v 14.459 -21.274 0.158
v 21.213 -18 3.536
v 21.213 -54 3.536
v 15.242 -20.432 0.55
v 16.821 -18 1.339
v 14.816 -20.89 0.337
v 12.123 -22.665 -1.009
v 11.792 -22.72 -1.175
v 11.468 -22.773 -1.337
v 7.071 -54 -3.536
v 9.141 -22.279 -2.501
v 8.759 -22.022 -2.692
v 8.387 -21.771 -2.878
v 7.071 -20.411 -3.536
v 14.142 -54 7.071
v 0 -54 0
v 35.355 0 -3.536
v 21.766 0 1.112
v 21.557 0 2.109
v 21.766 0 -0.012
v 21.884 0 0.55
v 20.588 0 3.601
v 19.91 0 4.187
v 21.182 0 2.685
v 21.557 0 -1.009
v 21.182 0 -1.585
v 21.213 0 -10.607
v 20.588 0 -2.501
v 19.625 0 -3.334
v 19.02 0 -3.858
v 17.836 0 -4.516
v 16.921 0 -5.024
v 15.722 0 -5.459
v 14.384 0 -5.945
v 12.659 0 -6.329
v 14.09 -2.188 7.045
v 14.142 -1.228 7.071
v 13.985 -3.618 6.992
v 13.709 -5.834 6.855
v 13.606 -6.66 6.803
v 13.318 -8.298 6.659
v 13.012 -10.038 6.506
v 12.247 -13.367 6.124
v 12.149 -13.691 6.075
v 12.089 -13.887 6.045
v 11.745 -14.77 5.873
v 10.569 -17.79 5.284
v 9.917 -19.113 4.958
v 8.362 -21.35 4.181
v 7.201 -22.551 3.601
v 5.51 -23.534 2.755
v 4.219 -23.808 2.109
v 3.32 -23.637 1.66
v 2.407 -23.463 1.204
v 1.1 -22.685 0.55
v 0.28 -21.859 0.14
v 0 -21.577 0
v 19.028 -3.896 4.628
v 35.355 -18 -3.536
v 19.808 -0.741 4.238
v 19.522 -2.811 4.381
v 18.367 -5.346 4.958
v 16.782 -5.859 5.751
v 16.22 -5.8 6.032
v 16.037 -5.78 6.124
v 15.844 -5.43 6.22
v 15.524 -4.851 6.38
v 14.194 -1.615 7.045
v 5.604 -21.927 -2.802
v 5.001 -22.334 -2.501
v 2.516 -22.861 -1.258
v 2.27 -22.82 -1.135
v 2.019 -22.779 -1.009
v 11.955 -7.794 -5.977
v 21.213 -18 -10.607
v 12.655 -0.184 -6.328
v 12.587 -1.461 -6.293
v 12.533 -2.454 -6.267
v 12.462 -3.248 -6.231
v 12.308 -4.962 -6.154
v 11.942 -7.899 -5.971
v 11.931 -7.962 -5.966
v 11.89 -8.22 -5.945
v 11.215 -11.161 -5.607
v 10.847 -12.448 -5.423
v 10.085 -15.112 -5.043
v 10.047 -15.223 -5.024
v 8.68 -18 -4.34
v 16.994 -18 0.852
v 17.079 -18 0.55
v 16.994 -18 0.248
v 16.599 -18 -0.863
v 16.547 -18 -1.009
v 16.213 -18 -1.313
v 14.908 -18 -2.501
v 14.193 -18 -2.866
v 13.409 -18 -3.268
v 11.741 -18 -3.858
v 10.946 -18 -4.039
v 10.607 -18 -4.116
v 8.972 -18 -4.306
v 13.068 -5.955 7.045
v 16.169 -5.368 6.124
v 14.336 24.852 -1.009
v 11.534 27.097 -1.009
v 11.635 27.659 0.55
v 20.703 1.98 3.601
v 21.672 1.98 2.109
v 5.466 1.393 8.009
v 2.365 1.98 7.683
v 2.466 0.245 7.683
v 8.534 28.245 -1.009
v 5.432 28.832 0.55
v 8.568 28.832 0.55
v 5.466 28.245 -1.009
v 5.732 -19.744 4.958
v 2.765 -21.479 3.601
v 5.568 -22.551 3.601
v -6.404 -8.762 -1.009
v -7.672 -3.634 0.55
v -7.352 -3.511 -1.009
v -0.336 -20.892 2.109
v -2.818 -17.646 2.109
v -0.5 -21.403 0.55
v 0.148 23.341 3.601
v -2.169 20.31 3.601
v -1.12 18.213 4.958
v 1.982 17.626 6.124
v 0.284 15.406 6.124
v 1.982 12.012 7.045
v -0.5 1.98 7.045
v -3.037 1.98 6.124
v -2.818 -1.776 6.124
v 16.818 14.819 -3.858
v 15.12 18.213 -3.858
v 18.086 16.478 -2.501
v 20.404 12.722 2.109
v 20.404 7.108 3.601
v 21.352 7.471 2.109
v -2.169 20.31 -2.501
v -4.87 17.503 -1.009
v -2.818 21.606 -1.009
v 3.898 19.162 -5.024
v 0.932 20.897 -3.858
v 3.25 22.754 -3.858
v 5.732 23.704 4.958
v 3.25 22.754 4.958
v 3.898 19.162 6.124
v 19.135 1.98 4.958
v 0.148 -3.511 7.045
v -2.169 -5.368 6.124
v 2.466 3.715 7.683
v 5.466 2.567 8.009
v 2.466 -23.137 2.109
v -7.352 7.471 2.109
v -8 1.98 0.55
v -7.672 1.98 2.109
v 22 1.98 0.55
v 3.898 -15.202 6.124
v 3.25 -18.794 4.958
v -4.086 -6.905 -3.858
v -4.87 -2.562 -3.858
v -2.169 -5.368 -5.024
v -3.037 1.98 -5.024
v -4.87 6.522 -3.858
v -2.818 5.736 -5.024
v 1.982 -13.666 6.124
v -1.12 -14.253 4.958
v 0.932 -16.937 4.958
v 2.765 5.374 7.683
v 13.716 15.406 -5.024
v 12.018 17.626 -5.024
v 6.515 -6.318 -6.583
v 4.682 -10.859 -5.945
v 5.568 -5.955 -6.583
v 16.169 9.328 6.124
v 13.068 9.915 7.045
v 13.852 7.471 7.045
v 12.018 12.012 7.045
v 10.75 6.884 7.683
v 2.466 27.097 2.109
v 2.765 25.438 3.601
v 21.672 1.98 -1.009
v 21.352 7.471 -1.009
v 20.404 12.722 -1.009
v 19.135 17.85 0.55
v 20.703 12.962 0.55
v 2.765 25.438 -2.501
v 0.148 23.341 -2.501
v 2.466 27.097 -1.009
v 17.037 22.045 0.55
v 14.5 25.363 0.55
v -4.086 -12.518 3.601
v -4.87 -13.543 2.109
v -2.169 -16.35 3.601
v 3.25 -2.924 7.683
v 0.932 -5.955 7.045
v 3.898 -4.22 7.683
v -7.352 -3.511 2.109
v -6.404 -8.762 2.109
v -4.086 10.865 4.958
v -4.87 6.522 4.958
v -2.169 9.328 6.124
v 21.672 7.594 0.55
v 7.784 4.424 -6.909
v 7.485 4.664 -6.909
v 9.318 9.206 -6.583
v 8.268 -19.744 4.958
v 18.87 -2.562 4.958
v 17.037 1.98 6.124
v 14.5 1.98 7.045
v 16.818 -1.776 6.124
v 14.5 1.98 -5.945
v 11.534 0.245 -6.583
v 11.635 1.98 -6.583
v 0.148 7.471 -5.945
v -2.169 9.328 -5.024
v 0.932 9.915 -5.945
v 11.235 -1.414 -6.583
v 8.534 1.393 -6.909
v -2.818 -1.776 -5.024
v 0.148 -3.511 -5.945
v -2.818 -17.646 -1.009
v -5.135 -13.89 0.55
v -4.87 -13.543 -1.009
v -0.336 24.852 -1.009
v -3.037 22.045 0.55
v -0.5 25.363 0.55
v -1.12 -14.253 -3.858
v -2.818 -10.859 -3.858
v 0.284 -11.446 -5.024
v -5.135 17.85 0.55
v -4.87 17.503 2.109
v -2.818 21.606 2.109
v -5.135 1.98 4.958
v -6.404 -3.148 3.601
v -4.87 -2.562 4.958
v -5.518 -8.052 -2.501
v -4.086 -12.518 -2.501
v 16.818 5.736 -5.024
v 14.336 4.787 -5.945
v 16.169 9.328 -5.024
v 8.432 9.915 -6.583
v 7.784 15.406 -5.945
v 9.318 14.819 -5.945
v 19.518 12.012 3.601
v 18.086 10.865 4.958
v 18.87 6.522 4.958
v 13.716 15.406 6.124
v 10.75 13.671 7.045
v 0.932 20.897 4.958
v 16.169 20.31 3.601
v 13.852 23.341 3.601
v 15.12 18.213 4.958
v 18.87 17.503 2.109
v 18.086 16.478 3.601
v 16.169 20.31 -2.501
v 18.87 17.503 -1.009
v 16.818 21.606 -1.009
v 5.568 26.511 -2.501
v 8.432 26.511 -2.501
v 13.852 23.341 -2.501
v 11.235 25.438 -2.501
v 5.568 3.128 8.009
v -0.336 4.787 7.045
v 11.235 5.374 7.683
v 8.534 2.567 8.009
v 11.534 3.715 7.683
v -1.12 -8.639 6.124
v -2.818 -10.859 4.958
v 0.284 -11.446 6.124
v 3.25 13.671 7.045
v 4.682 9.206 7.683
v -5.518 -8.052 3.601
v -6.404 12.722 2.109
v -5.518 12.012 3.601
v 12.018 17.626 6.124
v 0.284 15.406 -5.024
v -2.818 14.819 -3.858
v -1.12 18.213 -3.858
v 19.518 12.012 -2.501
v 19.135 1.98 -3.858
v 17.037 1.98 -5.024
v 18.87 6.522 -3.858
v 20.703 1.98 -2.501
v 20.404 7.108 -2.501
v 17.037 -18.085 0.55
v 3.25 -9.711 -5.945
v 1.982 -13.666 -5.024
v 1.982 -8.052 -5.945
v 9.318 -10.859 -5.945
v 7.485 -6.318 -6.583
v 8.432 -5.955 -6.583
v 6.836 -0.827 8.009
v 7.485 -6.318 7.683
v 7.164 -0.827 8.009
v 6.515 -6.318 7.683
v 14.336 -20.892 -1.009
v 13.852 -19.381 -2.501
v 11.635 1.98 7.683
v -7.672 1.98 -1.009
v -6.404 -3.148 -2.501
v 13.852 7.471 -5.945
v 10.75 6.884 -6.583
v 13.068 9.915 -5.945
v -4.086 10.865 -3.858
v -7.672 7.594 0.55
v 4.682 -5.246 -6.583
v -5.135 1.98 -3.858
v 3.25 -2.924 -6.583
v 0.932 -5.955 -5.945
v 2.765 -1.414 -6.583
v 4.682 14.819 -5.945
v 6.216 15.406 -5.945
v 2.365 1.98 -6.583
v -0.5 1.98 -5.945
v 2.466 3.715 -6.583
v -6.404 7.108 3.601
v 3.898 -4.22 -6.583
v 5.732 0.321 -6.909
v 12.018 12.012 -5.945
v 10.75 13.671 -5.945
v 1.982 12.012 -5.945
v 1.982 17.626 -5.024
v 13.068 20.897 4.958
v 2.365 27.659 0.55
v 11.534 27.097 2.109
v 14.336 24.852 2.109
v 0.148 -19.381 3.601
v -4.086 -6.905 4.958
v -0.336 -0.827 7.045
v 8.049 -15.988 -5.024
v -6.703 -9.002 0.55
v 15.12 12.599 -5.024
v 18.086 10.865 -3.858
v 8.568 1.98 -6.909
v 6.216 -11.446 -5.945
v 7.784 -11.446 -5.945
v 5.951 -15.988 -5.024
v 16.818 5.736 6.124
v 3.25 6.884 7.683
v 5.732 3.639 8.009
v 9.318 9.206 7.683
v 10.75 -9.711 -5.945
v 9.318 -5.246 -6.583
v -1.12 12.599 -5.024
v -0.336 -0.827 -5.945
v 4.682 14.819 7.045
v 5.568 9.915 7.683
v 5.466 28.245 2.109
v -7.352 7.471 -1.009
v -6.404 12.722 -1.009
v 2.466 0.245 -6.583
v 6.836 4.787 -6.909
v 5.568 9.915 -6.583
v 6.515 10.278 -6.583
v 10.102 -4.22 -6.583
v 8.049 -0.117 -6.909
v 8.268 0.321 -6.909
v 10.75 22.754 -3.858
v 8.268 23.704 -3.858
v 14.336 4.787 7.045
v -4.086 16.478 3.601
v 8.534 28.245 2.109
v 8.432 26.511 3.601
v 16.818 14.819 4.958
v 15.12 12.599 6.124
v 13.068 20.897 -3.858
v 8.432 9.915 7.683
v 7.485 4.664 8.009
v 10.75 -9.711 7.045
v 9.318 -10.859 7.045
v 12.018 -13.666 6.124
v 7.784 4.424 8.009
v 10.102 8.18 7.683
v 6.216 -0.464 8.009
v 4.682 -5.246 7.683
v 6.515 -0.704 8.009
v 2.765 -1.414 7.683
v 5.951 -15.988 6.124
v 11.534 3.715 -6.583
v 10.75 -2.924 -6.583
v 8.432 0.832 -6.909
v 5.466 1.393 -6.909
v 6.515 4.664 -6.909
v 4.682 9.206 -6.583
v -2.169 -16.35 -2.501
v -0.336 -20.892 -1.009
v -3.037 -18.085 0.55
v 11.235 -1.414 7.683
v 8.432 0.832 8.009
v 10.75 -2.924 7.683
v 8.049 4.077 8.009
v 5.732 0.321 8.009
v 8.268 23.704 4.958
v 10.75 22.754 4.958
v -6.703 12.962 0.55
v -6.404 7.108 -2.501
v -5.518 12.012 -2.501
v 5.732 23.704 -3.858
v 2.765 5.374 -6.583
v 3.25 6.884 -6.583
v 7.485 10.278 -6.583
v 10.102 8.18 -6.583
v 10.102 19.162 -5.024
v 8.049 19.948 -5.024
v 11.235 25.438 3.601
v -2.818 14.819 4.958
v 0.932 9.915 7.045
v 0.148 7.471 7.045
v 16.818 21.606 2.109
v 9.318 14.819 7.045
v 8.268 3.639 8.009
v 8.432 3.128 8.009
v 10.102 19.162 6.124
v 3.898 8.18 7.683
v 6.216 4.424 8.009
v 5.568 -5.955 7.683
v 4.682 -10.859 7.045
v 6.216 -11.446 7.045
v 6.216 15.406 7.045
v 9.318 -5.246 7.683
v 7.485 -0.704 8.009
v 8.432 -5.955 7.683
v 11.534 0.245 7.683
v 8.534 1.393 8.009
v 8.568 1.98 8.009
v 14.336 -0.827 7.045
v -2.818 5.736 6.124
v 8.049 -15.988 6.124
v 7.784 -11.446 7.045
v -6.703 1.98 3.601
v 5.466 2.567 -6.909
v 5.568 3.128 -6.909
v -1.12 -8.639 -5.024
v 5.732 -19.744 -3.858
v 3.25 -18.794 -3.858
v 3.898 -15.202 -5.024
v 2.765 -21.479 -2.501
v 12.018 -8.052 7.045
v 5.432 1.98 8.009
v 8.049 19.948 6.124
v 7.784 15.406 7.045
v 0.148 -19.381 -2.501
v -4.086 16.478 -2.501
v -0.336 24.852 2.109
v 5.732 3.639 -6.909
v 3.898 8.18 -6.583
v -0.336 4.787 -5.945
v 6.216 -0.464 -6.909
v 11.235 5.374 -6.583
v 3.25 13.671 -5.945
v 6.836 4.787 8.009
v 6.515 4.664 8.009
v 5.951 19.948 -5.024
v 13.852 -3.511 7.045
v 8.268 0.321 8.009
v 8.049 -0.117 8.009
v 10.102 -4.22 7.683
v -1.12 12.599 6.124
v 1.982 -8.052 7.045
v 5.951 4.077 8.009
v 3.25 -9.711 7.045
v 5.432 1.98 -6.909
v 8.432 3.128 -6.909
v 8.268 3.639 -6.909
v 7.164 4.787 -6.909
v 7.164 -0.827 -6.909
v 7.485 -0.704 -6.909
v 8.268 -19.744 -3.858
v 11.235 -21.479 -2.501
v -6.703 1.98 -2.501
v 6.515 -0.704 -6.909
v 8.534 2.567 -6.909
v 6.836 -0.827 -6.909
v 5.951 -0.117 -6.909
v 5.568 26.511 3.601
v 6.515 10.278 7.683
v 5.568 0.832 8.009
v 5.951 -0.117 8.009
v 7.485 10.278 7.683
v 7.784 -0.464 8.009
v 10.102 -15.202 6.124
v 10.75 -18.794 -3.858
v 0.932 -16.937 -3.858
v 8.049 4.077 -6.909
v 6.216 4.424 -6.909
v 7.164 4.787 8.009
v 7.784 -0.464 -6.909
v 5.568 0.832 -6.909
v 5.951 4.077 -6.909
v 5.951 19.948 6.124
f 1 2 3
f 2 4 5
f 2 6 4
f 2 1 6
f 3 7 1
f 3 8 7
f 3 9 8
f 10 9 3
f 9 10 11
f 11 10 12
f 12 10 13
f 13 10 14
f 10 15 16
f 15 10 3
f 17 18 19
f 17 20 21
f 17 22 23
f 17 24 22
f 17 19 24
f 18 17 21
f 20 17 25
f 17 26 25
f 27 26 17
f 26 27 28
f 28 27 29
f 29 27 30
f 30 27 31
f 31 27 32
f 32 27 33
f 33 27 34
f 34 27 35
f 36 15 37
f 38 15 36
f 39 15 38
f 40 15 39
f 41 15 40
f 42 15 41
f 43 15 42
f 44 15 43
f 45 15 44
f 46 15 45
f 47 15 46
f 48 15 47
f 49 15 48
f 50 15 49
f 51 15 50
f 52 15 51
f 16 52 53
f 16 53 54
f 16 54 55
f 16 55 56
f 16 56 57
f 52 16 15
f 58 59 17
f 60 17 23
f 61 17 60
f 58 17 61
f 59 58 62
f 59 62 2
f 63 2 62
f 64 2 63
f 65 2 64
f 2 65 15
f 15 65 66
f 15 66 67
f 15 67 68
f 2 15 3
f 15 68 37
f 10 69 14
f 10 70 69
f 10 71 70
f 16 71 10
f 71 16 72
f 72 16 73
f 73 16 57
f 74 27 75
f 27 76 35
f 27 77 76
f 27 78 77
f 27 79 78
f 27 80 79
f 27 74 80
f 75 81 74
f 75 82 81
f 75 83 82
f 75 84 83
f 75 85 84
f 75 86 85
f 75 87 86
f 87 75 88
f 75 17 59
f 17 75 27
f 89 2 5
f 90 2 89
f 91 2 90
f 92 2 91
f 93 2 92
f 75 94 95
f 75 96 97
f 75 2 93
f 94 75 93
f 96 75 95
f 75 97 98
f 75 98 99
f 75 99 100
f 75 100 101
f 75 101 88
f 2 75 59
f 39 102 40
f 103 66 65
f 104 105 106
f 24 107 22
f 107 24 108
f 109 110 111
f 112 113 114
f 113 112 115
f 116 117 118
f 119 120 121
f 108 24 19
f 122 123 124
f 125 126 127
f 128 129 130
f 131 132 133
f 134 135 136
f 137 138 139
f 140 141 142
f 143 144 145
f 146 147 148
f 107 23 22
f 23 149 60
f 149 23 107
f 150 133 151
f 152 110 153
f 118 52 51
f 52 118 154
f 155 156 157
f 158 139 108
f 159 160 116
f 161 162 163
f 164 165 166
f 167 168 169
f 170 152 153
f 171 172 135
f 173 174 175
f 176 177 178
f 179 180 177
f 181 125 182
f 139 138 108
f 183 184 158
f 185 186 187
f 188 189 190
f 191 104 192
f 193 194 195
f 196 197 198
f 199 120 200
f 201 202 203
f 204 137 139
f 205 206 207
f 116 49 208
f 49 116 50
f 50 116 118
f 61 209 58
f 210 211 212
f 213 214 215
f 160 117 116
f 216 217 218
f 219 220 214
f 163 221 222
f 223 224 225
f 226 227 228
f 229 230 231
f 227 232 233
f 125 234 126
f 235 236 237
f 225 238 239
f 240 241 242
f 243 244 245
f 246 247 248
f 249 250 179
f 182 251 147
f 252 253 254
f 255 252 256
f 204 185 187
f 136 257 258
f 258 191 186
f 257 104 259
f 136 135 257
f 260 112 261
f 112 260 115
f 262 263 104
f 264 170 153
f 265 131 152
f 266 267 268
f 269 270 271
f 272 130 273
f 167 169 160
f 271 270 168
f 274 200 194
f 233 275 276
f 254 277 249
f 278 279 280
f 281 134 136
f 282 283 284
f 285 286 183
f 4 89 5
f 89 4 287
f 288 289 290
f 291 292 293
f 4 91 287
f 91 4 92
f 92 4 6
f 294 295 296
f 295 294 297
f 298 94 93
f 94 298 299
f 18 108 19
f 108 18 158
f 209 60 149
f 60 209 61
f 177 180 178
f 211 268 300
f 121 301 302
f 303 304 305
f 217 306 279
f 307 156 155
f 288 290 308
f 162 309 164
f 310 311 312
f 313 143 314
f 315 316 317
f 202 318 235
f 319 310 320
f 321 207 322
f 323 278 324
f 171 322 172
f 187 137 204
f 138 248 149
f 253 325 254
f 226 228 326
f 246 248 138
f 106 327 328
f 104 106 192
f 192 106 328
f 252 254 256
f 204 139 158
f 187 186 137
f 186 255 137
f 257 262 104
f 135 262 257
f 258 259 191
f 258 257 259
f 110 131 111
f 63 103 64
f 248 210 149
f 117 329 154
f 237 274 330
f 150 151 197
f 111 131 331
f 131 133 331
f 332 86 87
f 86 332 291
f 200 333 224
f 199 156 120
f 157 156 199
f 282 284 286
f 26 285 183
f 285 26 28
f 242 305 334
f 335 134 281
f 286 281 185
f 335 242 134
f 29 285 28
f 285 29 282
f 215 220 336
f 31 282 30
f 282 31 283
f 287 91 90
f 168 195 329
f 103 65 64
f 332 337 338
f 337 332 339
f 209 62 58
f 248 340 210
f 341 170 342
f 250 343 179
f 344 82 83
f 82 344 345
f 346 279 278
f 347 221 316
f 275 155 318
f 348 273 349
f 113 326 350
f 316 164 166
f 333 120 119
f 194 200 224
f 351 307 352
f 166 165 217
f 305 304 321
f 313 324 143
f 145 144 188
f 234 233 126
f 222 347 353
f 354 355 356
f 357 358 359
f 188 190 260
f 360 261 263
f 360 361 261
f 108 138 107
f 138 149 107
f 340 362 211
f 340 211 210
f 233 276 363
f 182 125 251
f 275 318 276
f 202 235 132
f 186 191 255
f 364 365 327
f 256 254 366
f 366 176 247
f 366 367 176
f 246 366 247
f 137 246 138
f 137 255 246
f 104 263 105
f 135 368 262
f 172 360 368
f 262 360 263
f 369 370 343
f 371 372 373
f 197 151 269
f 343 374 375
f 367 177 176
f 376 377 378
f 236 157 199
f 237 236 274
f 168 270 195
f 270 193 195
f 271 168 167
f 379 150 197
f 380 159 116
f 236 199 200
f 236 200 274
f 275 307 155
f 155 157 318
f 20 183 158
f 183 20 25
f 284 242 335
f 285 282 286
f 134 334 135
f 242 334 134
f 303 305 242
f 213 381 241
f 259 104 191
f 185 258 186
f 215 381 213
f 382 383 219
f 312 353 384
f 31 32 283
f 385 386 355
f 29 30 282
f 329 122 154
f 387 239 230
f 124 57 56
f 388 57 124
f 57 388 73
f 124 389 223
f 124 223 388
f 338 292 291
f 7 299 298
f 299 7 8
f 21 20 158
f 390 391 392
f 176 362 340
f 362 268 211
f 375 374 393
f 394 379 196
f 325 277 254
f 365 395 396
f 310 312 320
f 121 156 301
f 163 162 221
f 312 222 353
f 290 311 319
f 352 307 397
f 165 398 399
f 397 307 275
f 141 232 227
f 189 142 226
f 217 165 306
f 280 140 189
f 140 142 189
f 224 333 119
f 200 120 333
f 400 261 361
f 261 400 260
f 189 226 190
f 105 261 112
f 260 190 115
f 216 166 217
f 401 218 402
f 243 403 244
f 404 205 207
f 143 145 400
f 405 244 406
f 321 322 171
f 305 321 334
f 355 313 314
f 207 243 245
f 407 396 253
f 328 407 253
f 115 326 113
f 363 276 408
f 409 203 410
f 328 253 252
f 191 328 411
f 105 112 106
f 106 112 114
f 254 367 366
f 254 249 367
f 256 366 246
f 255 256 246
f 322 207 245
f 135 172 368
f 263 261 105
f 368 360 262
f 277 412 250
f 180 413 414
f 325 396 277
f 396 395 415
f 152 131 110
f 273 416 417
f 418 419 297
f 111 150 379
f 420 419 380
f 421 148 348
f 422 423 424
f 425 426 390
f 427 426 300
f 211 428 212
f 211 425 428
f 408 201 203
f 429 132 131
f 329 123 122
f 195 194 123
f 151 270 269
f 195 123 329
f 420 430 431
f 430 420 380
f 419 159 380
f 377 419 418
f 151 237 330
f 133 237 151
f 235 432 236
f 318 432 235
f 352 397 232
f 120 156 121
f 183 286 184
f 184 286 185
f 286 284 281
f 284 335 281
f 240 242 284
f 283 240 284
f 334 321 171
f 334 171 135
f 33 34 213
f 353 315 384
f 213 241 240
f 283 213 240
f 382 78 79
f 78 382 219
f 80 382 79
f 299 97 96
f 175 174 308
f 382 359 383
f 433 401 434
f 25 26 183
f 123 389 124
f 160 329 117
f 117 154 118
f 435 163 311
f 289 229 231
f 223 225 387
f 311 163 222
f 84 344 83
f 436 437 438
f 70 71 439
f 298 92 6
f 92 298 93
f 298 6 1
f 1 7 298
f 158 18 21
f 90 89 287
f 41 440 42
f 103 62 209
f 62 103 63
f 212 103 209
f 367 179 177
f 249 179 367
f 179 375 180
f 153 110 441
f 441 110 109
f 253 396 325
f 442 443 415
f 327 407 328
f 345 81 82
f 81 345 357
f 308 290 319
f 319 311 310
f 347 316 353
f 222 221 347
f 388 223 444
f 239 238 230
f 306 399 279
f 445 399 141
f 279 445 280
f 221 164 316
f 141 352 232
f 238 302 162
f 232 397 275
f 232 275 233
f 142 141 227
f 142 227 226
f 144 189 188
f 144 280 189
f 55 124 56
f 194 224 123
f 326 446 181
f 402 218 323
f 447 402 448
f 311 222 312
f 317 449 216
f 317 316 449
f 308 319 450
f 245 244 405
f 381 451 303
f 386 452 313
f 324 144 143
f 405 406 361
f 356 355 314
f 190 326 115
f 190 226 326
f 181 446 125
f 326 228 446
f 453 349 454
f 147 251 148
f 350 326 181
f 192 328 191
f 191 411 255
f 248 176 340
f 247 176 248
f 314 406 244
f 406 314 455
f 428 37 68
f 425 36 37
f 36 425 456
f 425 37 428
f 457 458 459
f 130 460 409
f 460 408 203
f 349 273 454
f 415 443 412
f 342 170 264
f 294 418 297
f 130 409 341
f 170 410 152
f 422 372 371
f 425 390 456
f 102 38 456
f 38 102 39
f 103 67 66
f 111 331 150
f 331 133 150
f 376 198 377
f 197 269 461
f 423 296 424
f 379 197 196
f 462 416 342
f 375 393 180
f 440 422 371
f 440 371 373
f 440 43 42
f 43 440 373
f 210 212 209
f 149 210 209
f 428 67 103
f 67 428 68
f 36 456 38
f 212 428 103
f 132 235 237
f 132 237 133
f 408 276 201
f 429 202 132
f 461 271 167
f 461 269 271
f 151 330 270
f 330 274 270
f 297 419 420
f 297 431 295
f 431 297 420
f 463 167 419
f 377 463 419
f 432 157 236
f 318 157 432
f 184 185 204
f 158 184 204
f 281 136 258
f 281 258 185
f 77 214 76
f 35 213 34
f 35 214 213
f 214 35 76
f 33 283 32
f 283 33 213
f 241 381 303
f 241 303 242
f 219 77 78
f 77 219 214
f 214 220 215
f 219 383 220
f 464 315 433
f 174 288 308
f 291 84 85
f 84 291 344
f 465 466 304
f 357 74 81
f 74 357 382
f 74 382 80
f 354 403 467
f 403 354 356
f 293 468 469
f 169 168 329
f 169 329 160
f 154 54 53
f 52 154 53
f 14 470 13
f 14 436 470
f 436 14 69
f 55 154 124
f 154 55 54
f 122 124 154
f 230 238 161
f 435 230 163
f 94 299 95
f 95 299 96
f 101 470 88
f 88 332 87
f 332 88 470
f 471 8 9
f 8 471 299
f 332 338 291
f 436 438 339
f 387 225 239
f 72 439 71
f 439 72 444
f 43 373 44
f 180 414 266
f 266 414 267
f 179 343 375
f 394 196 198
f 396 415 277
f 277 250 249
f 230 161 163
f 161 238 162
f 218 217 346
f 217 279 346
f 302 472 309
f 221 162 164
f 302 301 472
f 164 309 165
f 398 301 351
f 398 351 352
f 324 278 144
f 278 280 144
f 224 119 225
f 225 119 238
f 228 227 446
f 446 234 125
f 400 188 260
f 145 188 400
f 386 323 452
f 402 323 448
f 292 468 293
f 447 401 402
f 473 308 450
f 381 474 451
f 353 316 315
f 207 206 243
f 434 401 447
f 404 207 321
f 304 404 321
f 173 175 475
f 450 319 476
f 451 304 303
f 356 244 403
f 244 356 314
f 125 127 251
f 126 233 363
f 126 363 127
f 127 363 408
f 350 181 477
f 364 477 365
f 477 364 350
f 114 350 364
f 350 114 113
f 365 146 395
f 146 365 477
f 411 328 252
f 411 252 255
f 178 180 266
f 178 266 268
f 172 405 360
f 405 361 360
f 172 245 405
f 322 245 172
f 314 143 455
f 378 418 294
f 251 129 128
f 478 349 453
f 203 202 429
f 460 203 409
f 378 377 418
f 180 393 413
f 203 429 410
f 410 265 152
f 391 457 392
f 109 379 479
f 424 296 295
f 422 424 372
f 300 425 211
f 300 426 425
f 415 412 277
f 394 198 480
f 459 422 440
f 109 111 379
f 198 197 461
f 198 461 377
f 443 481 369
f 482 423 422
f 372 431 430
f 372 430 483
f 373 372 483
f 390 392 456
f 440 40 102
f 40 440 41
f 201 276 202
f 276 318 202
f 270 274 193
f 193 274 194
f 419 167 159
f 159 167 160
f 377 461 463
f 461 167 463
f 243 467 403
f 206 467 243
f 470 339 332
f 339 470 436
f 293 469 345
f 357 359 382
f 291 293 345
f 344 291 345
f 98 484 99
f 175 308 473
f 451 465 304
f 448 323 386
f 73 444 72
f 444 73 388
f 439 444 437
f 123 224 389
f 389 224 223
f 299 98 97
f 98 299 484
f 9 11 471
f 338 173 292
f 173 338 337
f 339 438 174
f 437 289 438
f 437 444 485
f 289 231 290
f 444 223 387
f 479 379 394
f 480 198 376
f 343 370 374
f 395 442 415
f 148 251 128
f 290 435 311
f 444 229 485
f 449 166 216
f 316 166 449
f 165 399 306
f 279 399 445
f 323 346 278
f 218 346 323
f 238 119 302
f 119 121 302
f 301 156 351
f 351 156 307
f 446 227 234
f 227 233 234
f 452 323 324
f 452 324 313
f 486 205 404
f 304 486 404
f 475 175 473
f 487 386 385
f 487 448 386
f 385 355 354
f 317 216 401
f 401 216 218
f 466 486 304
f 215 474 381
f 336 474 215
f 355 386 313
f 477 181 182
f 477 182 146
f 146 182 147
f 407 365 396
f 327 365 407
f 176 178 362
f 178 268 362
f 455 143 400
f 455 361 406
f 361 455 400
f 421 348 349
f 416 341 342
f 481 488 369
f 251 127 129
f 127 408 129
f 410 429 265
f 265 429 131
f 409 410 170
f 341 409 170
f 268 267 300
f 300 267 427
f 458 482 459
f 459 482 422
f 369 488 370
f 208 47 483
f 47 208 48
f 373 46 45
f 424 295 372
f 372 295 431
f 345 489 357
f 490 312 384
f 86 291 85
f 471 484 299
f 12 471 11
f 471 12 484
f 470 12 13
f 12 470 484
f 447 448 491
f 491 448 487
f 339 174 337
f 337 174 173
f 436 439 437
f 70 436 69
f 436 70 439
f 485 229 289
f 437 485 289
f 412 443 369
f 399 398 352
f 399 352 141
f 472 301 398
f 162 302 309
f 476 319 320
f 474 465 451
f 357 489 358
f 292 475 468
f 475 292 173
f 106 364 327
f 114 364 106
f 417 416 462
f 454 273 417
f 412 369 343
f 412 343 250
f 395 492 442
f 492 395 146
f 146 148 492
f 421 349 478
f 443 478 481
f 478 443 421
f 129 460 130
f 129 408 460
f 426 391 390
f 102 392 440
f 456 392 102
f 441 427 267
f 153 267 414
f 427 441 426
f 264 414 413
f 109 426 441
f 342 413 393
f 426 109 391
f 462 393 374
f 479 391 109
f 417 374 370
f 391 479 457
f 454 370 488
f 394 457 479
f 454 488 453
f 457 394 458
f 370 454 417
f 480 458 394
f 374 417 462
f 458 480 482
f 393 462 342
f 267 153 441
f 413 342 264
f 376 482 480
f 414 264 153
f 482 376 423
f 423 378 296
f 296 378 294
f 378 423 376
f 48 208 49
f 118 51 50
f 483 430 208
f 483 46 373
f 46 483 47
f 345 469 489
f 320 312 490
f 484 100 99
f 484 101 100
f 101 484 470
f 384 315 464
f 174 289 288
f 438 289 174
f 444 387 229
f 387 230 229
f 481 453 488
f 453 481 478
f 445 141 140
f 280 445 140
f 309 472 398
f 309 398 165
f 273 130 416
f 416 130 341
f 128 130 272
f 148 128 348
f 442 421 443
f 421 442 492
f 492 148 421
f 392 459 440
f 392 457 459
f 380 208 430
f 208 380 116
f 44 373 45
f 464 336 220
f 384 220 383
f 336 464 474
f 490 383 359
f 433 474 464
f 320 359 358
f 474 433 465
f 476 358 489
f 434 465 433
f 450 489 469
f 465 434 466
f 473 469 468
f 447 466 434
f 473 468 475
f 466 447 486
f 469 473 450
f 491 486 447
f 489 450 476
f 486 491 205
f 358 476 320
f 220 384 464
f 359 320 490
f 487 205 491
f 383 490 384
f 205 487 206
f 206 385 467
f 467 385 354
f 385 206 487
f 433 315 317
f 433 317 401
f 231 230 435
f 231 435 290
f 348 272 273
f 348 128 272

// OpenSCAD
scale([1, 1.8, 0.5]) {
  translate([7, 1.1, 1.1]) {
    sphere(r=15);
  }
  rotate([90, 45, 0]) {
    cube(size=[10, 20, 30]);
    cube(size=[30, 20, 10]);
  }
}
